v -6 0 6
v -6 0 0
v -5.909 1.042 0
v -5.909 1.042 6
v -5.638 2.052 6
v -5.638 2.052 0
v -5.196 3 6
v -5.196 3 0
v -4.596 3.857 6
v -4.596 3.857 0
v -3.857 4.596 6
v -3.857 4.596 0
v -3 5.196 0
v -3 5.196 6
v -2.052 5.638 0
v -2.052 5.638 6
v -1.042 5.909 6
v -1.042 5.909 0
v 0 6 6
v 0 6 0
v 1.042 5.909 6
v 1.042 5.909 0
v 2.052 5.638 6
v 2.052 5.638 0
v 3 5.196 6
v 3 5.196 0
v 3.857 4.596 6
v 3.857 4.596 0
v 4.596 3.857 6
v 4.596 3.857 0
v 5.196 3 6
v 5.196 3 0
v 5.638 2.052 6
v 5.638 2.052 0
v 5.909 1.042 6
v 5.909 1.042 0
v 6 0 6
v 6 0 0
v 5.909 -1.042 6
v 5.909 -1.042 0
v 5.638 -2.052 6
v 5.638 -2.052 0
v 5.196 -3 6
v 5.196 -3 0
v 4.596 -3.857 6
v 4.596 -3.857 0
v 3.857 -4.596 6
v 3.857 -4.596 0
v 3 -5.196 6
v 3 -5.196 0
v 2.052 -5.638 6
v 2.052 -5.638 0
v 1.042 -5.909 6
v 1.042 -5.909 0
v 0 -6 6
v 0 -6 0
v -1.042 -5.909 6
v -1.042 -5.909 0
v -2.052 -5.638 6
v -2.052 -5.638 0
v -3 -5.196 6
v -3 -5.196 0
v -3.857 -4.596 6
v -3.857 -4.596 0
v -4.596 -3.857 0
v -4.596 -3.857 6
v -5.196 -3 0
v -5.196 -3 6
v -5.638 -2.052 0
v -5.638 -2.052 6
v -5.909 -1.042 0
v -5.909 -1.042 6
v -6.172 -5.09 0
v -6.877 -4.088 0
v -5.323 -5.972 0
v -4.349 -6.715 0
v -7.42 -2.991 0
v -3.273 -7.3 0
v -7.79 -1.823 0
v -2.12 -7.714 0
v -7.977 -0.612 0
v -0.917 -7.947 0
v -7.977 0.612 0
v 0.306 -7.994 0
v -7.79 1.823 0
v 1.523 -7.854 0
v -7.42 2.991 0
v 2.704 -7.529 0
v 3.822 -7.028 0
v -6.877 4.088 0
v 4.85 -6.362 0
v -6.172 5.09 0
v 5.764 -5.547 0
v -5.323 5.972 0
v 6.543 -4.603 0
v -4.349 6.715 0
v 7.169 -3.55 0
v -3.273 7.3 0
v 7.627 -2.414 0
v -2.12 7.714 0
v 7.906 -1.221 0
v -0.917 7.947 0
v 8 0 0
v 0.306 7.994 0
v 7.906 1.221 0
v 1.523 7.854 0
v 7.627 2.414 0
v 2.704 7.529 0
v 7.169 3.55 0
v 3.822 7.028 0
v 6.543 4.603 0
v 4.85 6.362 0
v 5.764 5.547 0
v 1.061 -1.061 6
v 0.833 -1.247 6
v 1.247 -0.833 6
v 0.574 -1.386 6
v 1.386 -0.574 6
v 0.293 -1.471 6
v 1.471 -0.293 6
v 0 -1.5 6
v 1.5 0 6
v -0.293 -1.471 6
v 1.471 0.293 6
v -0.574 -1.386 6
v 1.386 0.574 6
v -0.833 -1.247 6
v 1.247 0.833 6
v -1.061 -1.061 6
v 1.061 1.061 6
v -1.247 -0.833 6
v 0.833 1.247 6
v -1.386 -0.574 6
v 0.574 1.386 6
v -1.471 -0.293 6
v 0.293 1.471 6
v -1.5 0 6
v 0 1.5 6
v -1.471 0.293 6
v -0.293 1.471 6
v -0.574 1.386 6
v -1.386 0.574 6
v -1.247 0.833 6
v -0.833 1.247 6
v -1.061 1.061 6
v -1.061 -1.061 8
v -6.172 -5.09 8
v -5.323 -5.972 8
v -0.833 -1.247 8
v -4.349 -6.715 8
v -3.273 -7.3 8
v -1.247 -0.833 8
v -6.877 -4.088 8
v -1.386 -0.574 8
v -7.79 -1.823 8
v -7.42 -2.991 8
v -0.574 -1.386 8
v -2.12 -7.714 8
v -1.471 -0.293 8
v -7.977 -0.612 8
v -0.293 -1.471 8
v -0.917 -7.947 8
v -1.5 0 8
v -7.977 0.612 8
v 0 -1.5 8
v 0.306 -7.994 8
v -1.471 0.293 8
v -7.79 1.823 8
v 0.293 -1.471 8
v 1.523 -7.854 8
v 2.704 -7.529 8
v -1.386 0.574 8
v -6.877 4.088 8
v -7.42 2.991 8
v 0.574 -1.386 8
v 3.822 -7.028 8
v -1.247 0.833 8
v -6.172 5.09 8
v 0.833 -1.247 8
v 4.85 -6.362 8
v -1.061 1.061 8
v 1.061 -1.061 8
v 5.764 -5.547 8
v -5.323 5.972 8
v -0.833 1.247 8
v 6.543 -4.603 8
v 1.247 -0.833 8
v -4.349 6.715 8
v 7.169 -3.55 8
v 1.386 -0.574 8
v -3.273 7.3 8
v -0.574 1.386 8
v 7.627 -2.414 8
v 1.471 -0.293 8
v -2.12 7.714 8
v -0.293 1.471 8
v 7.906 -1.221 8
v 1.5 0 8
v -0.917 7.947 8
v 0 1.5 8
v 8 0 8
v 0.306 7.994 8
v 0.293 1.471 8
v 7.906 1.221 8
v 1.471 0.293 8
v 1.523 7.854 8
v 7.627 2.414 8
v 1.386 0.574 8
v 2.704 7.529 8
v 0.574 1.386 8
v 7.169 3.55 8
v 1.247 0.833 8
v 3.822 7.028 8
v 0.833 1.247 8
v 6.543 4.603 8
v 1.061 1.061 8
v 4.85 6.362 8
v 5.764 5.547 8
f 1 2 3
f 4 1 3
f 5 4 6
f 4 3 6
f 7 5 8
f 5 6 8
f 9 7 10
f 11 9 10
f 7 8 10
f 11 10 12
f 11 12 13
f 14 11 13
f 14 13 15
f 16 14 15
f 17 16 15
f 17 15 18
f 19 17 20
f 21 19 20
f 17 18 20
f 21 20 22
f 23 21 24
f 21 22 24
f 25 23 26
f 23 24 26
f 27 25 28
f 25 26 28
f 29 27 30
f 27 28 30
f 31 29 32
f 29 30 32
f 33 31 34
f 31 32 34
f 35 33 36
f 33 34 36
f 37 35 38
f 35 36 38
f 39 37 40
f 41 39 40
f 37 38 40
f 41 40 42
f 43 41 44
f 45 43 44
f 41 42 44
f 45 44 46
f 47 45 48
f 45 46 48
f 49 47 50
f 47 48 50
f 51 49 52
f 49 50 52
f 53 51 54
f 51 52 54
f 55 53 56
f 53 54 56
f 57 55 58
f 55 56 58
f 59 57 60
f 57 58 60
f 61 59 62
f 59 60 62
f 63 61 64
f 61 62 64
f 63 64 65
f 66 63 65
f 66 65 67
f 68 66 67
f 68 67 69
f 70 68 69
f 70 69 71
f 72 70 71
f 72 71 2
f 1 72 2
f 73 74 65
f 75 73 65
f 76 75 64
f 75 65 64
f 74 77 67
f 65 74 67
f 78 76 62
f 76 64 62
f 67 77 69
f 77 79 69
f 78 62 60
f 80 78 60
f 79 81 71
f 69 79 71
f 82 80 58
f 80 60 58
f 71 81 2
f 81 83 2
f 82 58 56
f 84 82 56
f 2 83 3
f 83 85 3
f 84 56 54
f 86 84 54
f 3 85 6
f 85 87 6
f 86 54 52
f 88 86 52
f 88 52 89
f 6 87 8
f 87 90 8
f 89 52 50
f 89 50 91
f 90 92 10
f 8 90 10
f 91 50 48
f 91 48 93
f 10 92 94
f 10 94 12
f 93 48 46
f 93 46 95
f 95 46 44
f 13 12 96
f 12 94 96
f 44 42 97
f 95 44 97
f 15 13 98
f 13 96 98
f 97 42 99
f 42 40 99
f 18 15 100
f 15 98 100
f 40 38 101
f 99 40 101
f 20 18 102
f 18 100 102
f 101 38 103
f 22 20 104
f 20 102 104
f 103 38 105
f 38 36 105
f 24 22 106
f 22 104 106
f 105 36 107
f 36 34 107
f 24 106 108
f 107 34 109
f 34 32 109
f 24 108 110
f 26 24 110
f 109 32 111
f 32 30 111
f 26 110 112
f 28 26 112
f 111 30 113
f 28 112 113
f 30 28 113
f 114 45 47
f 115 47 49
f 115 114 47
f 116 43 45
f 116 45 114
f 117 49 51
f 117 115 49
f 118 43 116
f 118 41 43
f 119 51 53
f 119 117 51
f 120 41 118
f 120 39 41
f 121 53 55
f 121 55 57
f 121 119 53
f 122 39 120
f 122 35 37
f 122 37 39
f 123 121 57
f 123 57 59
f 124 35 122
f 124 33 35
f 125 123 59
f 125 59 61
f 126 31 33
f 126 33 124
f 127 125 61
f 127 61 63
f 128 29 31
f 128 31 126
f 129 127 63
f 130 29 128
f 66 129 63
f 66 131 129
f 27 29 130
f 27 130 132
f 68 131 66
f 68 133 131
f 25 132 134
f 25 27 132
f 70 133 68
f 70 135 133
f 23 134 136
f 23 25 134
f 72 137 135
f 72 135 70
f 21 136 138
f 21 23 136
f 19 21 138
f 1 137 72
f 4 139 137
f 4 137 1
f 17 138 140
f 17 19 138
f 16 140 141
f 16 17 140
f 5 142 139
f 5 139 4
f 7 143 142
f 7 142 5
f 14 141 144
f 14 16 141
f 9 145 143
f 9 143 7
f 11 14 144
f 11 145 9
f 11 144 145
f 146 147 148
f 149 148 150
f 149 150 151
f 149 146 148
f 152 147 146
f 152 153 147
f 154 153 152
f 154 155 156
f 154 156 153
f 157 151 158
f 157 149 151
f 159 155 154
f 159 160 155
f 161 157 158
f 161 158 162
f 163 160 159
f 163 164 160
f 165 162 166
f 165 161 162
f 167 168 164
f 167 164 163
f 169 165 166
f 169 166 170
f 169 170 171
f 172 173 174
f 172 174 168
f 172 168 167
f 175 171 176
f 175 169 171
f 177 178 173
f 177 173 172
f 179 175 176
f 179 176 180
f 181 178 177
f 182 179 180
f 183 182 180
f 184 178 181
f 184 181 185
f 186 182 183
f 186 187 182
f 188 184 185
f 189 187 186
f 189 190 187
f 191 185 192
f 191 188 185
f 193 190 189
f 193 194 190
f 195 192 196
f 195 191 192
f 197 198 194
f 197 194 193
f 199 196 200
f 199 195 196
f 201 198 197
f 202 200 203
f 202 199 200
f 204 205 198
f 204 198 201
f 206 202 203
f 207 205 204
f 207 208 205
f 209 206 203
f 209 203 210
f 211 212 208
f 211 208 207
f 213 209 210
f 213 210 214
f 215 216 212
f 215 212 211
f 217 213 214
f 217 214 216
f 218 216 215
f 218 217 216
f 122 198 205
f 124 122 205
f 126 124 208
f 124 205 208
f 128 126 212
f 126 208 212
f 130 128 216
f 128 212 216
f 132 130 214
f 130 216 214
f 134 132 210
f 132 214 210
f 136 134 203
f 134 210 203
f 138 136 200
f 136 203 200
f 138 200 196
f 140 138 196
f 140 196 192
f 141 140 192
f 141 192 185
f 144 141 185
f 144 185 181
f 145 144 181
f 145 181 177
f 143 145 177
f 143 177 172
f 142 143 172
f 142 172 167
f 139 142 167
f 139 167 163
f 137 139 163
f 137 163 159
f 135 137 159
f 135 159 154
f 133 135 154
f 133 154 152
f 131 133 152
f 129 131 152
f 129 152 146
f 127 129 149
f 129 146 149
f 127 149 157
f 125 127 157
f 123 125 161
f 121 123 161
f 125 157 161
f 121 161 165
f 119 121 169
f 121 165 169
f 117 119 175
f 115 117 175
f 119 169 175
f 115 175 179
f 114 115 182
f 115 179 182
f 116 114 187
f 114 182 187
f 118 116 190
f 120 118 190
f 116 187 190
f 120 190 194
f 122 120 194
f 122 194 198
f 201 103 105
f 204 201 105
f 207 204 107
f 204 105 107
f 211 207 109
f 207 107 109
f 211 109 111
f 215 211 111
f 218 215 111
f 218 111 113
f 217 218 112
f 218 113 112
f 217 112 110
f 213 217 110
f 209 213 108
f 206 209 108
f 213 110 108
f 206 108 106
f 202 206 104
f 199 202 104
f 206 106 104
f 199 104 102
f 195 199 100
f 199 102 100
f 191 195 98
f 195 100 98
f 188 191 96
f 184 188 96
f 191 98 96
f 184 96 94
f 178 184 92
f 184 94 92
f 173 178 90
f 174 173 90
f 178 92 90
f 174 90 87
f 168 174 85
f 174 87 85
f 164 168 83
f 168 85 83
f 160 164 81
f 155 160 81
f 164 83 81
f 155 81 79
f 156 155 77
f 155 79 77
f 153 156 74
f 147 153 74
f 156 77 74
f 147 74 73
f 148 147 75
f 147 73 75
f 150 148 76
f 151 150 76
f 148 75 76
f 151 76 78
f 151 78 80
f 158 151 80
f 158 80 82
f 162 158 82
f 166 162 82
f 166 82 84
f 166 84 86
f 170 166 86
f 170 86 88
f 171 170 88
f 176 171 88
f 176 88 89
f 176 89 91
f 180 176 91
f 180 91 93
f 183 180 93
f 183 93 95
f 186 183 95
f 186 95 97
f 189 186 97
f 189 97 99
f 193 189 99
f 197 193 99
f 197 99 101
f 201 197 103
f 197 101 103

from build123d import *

# Parameters (mm, degrees)
SKETCH_1_R          = 8
EXTRUDE_1_DEPTH     = 8
SKETCH_2_R          = 6
CUT_EXTRUDE_1_DEPTH = 6
SKETCH_3_R          = 1.5
CUT_EXTRUDE_2_DEPTH = 14.856406461


with BuildPart() as part:
    # 草图1 → 凸台-拉伸1 (new body)
    with BuildSketch(Plane.XY):
        Circle(SKETCH_1_R)
    extrude(amount=EXTRUDE_1_DEPTH)

    # 草图2 → 切除-拉伸1 (cut)
    with BuildSketch(Plane(origin=(0, 0, 0), x_dir=(-1, 0, 0), z_dir=(0, 0, -1))):
        Circle(SKETCH_2_R)
    extrude(amount=-CUT_EXTRUDE_1_DEPTH, mode=Mode.SUBTRACT)

    # 草图3 → 切除-拉伸2 (cut, through all)
    with BuildSketch(Plane.XY.offset(8)):
        Circle(SKETCH_3_R)
    extrude(amount=-CUT_EXTRUDE_2_DEPTH, mode=Mode.SUBTRACT)


solid = part.part
